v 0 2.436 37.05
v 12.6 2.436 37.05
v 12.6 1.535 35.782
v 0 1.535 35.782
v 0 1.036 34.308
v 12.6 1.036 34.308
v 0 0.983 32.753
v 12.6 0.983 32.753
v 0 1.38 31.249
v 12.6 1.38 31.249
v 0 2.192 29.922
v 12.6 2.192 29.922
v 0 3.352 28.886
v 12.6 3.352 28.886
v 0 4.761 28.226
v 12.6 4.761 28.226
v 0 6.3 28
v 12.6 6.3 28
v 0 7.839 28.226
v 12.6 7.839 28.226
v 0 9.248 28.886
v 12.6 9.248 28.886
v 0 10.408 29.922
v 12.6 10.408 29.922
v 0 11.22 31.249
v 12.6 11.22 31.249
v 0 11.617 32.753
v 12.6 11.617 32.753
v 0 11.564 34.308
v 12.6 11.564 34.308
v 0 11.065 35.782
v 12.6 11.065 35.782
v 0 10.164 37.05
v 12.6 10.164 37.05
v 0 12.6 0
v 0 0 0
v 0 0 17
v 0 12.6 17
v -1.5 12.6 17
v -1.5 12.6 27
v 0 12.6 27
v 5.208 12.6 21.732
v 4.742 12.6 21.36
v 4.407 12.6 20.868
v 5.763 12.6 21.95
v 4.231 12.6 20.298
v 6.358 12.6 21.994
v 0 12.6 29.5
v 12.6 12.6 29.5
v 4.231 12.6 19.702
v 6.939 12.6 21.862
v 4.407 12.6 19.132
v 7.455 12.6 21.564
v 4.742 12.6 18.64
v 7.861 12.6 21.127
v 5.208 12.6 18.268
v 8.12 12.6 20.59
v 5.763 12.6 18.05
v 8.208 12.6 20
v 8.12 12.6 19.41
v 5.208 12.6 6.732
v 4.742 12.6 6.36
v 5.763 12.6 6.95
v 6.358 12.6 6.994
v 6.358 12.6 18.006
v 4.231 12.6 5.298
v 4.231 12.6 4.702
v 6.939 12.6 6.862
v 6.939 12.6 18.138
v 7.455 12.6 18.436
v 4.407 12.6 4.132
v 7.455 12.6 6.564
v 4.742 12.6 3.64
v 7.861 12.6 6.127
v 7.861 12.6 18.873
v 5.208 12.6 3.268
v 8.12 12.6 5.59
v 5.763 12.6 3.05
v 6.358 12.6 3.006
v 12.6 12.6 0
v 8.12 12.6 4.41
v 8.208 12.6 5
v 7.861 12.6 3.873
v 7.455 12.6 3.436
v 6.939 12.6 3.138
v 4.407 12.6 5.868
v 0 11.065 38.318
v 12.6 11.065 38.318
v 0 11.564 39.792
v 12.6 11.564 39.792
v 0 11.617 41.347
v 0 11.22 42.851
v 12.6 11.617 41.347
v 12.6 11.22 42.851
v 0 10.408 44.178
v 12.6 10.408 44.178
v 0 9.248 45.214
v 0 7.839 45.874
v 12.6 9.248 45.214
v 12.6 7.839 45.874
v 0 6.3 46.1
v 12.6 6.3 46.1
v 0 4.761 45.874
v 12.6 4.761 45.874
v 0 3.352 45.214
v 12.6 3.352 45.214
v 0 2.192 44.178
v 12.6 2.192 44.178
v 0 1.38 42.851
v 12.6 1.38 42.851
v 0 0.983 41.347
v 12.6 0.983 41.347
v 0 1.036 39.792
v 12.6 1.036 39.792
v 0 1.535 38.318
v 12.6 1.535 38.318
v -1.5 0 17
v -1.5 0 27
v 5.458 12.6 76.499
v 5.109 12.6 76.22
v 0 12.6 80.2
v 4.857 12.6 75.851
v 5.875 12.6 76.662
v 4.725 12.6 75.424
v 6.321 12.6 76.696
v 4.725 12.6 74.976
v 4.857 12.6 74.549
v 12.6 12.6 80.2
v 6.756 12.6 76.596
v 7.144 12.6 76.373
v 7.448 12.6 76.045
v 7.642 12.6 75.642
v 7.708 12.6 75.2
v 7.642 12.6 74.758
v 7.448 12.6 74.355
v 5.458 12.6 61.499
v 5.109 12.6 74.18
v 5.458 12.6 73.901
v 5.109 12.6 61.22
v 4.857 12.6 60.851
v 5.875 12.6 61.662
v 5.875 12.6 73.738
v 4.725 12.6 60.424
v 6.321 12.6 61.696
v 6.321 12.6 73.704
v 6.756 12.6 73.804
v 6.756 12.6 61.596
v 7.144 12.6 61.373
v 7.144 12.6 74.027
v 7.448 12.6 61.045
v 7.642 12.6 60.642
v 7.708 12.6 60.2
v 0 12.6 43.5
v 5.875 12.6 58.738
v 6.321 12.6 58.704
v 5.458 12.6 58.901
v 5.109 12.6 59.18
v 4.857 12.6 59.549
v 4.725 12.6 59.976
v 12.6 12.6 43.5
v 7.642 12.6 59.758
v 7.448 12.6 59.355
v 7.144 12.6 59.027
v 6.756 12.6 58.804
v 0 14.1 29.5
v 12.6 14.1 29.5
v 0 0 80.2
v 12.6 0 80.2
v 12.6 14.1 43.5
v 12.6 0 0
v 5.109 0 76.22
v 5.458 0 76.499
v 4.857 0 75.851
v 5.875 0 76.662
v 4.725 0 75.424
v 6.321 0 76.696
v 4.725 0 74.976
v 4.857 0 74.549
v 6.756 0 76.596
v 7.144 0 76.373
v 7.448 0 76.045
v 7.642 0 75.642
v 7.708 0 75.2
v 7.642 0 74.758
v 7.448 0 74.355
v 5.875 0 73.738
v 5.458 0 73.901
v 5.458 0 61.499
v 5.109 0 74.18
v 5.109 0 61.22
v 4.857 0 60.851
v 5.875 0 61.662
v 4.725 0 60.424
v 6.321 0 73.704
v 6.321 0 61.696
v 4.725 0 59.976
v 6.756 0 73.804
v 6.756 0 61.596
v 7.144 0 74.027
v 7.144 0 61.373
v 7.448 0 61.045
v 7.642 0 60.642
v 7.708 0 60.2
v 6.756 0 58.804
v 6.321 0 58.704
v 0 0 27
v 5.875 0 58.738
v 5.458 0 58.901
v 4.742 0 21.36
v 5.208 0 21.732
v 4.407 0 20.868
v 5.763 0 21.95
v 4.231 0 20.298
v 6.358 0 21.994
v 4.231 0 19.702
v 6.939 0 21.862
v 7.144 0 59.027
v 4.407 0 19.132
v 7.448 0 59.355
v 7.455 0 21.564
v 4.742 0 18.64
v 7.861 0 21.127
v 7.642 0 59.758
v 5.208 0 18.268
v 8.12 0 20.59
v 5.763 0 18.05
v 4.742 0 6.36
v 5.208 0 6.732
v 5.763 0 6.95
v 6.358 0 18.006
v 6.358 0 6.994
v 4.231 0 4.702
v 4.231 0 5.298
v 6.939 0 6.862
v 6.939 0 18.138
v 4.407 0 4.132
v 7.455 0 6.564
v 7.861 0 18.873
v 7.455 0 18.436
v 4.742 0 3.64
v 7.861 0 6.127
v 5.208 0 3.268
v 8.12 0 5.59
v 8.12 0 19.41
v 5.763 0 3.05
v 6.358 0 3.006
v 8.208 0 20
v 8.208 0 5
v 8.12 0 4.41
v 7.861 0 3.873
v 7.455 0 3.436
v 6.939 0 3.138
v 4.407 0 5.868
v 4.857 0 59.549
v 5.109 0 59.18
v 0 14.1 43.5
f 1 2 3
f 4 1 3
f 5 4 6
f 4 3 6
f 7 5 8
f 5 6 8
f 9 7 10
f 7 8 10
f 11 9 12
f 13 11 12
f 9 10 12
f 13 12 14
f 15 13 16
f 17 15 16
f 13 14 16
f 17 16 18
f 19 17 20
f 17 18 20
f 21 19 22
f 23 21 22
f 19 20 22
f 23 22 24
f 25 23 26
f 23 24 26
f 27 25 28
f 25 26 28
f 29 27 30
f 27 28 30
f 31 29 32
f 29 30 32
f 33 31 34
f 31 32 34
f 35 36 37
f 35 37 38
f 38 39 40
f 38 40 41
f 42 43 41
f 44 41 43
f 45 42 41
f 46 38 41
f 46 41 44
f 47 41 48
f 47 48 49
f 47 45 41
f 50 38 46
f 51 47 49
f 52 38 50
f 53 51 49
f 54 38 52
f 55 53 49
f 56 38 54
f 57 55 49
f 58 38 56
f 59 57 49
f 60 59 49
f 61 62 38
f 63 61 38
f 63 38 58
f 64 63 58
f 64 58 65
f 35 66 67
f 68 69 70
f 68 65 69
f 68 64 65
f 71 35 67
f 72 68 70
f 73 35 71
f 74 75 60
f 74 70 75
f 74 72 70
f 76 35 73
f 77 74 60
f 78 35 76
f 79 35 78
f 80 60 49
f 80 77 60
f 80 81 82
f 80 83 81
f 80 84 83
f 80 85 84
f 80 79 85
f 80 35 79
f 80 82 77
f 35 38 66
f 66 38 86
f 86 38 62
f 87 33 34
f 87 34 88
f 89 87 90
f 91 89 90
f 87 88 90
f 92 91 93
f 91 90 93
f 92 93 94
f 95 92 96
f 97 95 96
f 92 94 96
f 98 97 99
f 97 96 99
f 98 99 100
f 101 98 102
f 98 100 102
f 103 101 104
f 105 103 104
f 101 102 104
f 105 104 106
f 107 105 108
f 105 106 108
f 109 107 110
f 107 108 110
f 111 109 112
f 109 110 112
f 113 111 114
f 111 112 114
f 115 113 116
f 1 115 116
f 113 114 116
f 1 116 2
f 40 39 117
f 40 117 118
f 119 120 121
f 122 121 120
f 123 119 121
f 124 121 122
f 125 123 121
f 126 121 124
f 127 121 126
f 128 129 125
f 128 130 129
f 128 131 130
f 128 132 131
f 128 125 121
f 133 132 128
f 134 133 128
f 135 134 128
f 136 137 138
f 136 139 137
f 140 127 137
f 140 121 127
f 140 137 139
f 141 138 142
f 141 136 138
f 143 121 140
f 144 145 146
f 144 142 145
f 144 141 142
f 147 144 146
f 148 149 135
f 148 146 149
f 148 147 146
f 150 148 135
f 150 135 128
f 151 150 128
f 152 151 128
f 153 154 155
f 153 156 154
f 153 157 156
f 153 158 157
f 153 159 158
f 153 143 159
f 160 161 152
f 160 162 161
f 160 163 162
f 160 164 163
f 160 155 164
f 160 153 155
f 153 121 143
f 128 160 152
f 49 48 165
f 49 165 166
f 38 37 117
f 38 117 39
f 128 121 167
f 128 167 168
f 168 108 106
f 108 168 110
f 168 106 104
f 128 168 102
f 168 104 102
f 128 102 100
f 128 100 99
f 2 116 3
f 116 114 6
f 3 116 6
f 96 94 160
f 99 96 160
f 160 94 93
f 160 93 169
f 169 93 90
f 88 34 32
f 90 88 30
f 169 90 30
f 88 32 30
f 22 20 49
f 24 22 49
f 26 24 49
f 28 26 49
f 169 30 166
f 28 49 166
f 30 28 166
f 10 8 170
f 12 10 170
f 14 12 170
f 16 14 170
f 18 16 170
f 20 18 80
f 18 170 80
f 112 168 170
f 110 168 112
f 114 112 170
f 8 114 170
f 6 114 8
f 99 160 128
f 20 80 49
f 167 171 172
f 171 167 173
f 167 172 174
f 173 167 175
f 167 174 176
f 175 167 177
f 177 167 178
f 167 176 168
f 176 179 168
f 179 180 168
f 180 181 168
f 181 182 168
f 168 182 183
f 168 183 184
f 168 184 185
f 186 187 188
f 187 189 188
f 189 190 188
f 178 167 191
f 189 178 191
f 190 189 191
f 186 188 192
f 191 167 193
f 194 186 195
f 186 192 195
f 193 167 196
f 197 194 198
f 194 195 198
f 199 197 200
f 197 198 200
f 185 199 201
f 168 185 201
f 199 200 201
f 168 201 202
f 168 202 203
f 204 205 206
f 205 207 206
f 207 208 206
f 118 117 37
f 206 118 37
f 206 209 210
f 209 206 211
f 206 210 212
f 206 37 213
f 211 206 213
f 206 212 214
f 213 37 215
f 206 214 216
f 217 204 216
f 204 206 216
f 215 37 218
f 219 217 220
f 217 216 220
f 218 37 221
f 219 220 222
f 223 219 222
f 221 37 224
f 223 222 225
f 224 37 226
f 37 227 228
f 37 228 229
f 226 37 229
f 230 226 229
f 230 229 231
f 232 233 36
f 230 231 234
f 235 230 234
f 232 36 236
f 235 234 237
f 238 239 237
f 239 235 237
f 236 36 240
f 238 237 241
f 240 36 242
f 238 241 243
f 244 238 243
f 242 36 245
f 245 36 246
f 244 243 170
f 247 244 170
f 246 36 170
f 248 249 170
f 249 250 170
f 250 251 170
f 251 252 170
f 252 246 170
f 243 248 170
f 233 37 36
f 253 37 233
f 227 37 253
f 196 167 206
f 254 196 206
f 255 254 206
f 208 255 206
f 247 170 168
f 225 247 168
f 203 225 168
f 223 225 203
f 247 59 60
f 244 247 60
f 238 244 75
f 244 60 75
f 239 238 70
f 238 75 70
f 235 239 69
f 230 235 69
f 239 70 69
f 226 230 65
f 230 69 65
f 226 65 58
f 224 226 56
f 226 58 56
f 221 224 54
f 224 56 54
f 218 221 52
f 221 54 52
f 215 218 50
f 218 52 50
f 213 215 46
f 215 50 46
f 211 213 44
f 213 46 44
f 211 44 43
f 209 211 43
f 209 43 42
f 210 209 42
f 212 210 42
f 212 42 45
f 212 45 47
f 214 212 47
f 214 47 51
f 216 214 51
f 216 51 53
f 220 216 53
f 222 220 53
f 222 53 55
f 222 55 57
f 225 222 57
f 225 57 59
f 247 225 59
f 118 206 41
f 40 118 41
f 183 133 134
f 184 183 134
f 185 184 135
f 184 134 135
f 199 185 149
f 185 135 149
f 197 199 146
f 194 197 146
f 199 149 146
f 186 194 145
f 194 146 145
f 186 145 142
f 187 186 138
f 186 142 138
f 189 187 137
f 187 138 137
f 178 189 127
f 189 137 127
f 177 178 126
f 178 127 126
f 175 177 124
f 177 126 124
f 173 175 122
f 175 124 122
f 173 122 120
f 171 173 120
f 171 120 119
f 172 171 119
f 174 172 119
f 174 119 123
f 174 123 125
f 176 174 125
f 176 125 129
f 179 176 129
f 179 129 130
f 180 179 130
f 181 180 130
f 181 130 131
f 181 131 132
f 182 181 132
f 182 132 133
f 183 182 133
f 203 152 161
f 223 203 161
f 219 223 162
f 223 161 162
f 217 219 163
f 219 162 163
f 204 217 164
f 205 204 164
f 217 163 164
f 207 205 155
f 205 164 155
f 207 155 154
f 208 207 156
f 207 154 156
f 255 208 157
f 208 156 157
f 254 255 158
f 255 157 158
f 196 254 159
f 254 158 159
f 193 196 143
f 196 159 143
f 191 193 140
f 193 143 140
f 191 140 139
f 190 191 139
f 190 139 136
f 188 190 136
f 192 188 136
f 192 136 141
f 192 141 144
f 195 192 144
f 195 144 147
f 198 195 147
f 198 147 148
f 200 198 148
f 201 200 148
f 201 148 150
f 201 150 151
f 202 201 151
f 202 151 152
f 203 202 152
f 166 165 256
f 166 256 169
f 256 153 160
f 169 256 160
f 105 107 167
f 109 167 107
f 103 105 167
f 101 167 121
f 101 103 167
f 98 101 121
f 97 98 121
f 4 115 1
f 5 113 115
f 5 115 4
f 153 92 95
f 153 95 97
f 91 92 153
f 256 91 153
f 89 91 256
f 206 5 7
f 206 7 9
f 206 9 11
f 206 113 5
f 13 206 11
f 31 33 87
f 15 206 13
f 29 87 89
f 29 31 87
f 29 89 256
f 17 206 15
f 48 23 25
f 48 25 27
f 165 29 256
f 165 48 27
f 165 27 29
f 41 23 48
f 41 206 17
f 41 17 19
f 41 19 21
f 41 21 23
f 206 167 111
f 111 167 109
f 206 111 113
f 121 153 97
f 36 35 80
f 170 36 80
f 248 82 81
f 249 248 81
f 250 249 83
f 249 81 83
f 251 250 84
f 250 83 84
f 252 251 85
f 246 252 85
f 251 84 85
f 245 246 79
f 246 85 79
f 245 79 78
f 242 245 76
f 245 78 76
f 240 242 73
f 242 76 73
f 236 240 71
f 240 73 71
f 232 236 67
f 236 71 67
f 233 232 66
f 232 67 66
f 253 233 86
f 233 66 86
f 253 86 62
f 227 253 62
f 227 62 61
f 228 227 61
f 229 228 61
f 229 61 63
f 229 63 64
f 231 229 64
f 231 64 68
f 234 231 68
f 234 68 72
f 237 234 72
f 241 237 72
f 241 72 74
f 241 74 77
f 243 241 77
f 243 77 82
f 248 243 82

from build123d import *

# Parameters (mm, degrees)
ESQUISSE1_W             = 12.6
ESQUISSE1_H             = 12.6
BOSS_EXTRU_1_DEPTH      = 80.2
ESQUISSE2_R             = 1.5
ESQUISSE2_R_2           = 2
ENL_V_MAT_EXTRU_1_DEPTH = 13.6
ESQUISSE3_R             = 5.35
ENL_V_MAT_EXTRU_4_DEPTH = 13.6
ESQUISSE4_W             = 12.6
ESQUISSE4_H             = 14
BOSS_EXTRU_2_DEPTH      = 1.5
ESQUISSE5_W             = 10
ESQUISSE5_H             = 12.6
BOSS_EXTRU_3_DEPTH      = 1.5


with BuildPart() as part:
    # Esquisse1 → Boss.-Extru.1 (new body)
    with BuildSketch(Plane.XY):
        with Locations((6.3, 6.3)):
            Rectangle(ESQUISSE1_W, ESQUISSE1_H)
    extrude(amount=BOSS_EXTRU_1_DEPTH)

    # Esquisse2 → Enlèv. mat.-Extru.1 (cut, through all)
    with BuildSketch(Plane(origin=(0, 12.6, 0), x_dir=(1, 0, 0), z_dir=(0, 1, 0))):
        with Locations((6.208458314, -75.2)):
            Circle(ESQUISSE2_R)
        with Locations((6.208458314, -60.2)):
            Circle(ESQUISSE2_R)
        with Locations((6.208458314, -20)):
            Circle(ESQUISSE2_R_2)
        with Locations((6.208458314, -5)):
            Circle(ESQUISSE2_R_2)
    extrude(amount=-ENL_V_MAT_EXTRU_1_DEPTH, mode=Mode.SUBTRACT)

    # Esquisse3 → Enlèv. mat.-Extru.4 (cut, through all)
    with BuildSketch(Plane(origin=(12.6, 0, 0), x_dir=(0, 0, -1), z_dir=(1, 0, 0))):
        with Locations((-33.35, 6.3)):
            Circle(ESQUISSE3_R)
        with Locations((-40.75, 6.3)):
            Circle(ESQUISSE3_R)
    extrude(amount=-ENL_V_MAT_EXTRU_4_DEPTH, mode=Mode.SUBTRACT)

    # Esquisse4 → Boss.-Extru.2 (add)
    with BuildSketch(Plane(origin=(0, 12.6, 0), x_dir=(1, 0, 0), z_dir=(0, 1, 0))):
        with Locations((6.3, -36.5)):
            Rectangle(ESQUISSE4_W, ESQUISSE4_H)
    extrude(amount=BOSS_EXTRU_2_DEPTH)

    # Esquisse5 → Boss.-Extru.3 (add)
    with BuildSketch(Plane.ZY):
        with Locations((22, 6.3)):
            Rectangle(ESQUISSE5_W, ESQUISSE5_H)
    extrude(amount=BOSS_EXTRU_3_DEPTH)


solid = part.part
